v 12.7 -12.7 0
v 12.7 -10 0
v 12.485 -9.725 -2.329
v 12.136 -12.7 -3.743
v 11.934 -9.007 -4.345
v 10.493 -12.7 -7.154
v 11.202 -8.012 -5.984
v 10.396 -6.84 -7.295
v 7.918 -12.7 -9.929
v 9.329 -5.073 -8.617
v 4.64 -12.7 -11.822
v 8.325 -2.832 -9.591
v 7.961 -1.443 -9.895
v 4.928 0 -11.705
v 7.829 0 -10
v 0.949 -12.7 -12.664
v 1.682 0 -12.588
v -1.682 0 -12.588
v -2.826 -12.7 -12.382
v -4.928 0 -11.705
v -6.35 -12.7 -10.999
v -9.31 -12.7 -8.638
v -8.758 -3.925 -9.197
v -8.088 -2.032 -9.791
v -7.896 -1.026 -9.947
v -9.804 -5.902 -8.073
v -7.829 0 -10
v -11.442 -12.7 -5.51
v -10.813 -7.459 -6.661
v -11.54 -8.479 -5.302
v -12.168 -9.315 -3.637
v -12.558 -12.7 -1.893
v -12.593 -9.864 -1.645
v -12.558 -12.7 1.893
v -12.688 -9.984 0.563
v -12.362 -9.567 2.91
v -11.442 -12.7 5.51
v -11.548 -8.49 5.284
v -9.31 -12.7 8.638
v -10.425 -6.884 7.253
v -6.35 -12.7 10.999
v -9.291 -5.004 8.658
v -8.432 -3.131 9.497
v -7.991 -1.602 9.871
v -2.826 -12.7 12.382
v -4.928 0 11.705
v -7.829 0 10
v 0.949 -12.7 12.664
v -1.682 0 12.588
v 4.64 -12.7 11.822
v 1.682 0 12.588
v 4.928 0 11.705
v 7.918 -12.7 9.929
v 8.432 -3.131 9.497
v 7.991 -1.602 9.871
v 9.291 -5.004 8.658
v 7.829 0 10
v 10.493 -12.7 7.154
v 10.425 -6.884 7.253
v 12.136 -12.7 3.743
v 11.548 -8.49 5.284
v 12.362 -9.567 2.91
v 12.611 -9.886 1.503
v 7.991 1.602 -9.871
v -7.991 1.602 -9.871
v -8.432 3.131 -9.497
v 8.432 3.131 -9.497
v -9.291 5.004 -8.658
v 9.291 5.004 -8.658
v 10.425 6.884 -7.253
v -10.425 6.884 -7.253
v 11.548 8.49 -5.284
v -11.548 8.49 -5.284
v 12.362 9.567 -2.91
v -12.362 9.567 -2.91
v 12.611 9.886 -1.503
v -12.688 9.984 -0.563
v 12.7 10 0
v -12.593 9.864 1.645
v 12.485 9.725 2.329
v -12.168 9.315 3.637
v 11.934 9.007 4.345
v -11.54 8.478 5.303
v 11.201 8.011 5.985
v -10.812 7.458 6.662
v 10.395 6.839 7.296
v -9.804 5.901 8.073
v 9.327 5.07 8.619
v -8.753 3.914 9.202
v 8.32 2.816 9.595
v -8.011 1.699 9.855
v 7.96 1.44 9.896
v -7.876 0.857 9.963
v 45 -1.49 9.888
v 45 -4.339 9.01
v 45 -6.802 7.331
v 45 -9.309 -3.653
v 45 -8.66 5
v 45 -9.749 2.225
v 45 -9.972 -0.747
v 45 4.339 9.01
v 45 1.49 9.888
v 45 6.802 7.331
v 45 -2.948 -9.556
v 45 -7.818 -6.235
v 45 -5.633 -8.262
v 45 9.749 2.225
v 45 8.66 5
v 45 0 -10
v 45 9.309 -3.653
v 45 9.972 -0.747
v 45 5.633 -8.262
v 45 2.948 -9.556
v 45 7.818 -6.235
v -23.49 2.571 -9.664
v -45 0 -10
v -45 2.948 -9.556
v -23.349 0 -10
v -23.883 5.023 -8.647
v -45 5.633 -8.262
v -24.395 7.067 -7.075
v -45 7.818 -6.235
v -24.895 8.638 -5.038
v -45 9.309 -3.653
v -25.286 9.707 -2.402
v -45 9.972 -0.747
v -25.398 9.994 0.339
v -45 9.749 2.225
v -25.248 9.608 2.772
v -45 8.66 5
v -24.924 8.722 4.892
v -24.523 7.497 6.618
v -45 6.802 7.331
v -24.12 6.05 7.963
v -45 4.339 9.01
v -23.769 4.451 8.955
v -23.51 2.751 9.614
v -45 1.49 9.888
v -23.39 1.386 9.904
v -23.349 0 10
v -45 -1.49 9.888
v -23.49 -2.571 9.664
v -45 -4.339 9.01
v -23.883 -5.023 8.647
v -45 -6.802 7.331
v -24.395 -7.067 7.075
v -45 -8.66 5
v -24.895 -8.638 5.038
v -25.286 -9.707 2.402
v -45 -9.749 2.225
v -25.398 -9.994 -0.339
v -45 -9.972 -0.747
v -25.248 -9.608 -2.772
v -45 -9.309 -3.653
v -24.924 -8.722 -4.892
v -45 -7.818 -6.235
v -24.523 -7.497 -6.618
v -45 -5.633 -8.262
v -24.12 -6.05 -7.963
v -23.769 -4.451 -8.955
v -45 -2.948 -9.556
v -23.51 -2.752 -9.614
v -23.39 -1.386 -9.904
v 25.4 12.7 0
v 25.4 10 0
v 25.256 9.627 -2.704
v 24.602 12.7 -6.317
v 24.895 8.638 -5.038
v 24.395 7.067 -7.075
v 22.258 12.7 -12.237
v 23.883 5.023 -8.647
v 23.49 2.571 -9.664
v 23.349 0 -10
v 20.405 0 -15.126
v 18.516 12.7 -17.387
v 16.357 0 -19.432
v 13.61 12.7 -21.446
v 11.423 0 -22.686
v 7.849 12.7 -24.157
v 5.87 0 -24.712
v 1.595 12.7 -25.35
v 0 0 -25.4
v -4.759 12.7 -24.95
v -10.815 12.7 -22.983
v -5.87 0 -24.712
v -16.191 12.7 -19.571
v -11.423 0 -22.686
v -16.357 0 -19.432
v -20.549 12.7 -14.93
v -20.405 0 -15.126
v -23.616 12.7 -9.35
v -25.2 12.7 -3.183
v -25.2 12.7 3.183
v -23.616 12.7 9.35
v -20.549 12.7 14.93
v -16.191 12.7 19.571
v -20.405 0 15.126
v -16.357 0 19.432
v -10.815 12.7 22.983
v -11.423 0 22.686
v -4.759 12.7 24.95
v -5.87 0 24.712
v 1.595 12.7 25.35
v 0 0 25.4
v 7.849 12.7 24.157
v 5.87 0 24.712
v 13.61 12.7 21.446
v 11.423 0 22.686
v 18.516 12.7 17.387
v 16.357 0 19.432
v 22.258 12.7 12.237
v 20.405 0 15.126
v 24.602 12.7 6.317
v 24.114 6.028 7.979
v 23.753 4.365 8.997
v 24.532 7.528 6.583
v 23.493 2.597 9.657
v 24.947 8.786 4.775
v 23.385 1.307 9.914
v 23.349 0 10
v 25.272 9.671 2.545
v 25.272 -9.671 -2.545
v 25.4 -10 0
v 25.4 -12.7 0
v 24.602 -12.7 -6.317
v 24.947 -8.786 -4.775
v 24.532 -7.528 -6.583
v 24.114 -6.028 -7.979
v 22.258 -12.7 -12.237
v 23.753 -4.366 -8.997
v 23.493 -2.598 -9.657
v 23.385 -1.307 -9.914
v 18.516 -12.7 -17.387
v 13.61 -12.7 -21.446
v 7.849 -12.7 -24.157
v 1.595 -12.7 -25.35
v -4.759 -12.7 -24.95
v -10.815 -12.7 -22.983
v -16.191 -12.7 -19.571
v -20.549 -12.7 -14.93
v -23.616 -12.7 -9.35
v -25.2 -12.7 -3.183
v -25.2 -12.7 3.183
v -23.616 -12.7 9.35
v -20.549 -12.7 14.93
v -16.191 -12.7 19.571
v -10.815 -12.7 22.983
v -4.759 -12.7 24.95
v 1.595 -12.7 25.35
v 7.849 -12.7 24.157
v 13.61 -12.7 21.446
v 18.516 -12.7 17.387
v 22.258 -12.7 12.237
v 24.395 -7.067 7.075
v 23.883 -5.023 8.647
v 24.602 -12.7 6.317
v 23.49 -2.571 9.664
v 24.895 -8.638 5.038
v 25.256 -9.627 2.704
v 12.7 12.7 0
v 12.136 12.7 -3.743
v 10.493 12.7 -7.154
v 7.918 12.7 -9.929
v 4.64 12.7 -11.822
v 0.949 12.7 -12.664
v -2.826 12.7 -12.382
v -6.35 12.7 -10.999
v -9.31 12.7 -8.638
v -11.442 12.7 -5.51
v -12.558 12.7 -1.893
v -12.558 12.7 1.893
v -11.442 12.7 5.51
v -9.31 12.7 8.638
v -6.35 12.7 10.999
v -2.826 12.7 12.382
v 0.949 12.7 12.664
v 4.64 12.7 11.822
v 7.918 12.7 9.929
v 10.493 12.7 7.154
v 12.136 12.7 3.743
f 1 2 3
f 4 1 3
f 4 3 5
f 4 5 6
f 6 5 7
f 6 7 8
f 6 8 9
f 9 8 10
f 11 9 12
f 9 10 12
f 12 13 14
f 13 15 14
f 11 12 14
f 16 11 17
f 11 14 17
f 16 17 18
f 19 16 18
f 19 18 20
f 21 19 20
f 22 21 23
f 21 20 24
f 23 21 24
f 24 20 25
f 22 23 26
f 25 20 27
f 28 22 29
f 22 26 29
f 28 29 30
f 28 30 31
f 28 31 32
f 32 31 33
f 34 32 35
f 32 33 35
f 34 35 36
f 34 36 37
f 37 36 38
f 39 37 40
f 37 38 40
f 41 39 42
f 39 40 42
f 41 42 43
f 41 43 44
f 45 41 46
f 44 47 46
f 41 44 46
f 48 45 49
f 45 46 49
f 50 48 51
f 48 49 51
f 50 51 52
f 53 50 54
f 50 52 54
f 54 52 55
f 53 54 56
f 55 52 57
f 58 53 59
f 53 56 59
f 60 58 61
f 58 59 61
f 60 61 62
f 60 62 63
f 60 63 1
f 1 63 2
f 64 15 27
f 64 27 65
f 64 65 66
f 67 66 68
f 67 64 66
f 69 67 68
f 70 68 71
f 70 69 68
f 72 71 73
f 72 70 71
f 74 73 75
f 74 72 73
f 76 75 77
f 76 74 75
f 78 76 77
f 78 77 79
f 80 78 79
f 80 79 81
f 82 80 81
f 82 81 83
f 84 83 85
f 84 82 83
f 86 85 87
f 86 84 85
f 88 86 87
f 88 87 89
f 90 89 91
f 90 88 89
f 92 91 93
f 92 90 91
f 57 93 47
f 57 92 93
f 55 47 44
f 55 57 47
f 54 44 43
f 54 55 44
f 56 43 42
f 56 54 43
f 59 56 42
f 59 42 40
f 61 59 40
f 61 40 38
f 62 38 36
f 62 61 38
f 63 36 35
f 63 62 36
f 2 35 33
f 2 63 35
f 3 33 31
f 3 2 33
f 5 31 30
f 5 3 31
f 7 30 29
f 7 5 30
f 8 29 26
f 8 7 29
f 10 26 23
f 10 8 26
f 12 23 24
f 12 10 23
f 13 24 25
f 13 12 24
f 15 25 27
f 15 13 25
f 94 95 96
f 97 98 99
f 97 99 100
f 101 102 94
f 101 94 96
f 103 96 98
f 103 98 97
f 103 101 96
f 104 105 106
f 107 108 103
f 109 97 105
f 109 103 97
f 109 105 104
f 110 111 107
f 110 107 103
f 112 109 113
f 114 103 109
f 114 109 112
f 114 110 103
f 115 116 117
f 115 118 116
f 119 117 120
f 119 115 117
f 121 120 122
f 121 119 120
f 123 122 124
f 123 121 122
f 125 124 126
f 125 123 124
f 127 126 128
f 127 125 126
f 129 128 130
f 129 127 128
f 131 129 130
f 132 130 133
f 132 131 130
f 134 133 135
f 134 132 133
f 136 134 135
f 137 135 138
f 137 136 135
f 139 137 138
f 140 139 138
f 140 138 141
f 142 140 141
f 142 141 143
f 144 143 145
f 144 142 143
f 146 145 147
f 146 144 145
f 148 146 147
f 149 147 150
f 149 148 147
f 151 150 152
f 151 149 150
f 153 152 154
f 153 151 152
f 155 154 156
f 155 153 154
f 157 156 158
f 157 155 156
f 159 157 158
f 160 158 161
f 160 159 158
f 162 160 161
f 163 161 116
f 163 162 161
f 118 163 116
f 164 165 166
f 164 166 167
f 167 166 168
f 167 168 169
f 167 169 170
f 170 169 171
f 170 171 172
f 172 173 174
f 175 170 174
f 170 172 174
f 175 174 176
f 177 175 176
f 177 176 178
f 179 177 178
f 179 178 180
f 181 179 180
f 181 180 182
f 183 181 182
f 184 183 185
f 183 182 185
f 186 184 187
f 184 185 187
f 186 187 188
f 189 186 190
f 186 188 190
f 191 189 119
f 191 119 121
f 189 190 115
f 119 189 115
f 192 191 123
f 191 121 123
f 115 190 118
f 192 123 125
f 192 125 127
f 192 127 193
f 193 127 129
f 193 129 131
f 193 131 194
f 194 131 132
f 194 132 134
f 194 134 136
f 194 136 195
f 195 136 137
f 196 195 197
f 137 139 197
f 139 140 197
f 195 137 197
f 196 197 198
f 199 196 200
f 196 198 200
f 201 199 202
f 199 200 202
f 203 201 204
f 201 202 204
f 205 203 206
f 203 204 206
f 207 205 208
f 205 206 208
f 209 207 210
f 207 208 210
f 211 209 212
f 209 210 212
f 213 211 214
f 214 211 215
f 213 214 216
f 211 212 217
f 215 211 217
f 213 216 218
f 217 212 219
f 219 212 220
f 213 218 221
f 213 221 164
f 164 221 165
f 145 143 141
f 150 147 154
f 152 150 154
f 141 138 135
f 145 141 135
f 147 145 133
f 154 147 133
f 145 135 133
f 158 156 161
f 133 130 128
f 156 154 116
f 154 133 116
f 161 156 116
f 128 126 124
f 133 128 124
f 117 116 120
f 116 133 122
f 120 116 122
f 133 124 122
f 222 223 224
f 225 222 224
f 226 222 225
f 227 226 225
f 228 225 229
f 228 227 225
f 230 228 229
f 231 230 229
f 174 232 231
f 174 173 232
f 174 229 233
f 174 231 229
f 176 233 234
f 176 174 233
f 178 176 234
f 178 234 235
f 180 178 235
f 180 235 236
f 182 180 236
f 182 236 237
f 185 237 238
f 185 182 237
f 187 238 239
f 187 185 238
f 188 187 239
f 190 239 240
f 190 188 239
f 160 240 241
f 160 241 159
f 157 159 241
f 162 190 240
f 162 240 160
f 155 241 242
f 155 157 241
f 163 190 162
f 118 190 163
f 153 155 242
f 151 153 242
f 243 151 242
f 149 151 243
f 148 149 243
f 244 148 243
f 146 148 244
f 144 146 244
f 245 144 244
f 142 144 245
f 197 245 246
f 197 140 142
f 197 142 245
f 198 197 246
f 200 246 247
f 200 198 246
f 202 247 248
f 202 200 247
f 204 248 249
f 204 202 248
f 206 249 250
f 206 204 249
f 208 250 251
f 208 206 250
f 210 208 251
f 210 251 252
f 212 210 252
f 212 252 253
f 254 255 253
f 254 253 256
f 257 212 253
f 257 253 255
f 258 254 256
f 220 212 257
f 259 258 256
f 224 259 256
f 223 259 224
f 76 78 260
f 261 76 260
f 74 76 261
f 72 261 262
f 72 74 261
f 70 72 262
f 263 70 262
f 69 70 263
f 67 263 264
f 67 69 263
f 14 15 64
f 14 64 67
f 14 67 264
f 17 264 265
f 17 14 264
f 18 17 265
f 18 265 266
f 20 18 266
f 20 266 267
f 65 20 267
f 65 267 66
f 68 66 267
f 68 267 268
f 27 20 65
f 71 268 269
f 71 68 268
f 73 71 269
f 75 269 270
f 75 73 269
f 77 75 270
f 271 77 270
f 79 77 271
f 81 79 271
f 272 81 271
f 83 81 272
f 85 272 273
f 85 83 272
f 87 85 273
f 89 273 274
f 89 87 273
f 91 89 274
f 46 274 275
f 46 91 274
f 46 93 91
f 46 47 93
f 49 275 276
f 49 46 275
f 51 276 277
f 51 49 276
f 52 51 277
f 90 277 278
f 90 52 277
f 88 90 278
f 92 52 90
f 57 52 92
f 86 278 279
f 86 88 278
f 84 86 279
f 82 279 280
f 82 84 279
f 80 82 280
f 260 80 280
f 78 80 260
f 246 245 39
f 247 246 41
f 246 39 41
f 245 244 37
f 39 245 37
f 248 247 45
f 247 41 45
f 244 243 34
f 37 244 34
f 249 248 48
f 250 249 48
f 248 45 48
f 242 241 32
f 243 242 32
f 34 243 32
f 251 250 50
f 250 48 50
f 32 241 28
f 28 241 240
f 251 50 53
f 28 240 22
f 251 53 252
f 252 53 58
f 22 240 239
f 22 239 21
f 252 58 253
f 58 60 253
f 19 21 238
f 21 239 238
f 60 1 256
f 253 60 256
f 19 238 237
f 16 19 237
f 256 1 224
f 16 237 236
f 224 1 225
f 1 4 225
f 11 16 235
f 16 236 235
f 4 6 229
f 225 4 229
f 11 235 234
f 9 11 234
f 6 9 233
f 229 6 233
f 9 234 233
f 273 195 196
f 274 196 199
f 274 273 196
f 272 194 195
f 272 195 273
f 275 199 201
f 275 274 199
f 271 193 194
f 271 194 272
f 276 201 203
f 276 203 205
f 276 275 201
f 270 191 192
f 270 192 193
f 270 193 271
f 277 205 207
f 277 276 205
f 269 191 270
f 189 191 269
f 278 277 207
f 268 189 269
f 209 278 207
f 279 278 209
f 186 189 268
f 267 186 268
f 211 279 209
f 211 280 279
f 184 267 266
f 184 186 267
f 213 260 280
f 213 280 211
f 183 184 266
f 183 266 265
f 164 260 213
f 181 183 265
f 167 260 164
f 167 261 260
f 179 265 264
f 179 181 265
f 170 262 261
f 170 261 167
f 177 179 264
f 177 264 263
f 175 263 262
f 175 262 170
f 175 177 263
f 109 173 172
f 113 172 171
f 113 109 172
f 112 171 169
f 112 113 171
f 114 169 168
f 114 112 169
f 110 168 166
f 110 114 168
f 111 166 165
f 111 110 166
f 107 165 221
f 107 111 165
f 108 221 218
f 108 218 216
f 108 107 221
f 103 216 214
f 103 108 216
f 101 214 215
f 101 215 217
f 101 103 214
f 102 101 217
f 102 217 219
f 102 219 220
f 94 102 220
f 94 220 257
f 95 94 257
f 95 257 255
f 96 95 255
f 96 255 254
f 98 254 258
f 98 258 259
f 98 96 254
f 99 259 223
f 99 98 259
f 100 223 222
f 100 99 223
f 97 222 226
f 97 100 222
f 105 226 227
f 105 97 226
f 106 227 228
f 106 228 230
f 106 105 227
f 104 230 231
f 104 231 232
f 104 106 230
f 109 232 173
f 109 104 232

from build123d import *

# Parameters (mm, degrees)
BOSS_EXTRUDE1_DEPTH      = 45
BOSS_EXTRUDE1_DEPTH_BACK = 45
SKETCH2_R                = 10
BOSS_EXTRUDE2_DEPTH      = 12.7
BOSS_EXTRUDE2_DEPTH_BACK = 12.7
SKETCH1_R                = 25.4
SKETCH1_R_2              = 12.7


with BuildPart() as part:
    # Sketch2 → Boss-Extrude1 (new, two sides: drawn at the far end of the back side and taken through both)
    with BuildSketch(Plane(origin=(0, 0, 0), x_dir=(0, 0, -1), z_dir=(1, 0, 0)).offset(-BOSS_EXTRUDE1_DEPTH_BACK)):
        Circle(SKETCH2_R)
    extrude(amount=BOSS_EXTRUDE1_DEPTH + BOSS_EXTRUDE1_DEPTH_BACK)

    # Sketch1 → Boss-Extrude2 (add, two sides: drawn at the far end of the back side and taken through both)
    with BuildSketch(Plane(origin=(0, 0, 0), x_dir=(1, 0, 0), z_dir=(0, 1, 0)).offset(-BOSS_EXTRUDE2_DEPTH_BACK)):
        Circle(SKETCH1_R)
        Circle(SKETCH1_R_2, mode=Mode.SUBTRACT)
    extrude(amount=BOSS_EXTRUDE2_DEPTH + BOSS_EXTRUDE2_DEPTH_BACK)


solid = part.part
